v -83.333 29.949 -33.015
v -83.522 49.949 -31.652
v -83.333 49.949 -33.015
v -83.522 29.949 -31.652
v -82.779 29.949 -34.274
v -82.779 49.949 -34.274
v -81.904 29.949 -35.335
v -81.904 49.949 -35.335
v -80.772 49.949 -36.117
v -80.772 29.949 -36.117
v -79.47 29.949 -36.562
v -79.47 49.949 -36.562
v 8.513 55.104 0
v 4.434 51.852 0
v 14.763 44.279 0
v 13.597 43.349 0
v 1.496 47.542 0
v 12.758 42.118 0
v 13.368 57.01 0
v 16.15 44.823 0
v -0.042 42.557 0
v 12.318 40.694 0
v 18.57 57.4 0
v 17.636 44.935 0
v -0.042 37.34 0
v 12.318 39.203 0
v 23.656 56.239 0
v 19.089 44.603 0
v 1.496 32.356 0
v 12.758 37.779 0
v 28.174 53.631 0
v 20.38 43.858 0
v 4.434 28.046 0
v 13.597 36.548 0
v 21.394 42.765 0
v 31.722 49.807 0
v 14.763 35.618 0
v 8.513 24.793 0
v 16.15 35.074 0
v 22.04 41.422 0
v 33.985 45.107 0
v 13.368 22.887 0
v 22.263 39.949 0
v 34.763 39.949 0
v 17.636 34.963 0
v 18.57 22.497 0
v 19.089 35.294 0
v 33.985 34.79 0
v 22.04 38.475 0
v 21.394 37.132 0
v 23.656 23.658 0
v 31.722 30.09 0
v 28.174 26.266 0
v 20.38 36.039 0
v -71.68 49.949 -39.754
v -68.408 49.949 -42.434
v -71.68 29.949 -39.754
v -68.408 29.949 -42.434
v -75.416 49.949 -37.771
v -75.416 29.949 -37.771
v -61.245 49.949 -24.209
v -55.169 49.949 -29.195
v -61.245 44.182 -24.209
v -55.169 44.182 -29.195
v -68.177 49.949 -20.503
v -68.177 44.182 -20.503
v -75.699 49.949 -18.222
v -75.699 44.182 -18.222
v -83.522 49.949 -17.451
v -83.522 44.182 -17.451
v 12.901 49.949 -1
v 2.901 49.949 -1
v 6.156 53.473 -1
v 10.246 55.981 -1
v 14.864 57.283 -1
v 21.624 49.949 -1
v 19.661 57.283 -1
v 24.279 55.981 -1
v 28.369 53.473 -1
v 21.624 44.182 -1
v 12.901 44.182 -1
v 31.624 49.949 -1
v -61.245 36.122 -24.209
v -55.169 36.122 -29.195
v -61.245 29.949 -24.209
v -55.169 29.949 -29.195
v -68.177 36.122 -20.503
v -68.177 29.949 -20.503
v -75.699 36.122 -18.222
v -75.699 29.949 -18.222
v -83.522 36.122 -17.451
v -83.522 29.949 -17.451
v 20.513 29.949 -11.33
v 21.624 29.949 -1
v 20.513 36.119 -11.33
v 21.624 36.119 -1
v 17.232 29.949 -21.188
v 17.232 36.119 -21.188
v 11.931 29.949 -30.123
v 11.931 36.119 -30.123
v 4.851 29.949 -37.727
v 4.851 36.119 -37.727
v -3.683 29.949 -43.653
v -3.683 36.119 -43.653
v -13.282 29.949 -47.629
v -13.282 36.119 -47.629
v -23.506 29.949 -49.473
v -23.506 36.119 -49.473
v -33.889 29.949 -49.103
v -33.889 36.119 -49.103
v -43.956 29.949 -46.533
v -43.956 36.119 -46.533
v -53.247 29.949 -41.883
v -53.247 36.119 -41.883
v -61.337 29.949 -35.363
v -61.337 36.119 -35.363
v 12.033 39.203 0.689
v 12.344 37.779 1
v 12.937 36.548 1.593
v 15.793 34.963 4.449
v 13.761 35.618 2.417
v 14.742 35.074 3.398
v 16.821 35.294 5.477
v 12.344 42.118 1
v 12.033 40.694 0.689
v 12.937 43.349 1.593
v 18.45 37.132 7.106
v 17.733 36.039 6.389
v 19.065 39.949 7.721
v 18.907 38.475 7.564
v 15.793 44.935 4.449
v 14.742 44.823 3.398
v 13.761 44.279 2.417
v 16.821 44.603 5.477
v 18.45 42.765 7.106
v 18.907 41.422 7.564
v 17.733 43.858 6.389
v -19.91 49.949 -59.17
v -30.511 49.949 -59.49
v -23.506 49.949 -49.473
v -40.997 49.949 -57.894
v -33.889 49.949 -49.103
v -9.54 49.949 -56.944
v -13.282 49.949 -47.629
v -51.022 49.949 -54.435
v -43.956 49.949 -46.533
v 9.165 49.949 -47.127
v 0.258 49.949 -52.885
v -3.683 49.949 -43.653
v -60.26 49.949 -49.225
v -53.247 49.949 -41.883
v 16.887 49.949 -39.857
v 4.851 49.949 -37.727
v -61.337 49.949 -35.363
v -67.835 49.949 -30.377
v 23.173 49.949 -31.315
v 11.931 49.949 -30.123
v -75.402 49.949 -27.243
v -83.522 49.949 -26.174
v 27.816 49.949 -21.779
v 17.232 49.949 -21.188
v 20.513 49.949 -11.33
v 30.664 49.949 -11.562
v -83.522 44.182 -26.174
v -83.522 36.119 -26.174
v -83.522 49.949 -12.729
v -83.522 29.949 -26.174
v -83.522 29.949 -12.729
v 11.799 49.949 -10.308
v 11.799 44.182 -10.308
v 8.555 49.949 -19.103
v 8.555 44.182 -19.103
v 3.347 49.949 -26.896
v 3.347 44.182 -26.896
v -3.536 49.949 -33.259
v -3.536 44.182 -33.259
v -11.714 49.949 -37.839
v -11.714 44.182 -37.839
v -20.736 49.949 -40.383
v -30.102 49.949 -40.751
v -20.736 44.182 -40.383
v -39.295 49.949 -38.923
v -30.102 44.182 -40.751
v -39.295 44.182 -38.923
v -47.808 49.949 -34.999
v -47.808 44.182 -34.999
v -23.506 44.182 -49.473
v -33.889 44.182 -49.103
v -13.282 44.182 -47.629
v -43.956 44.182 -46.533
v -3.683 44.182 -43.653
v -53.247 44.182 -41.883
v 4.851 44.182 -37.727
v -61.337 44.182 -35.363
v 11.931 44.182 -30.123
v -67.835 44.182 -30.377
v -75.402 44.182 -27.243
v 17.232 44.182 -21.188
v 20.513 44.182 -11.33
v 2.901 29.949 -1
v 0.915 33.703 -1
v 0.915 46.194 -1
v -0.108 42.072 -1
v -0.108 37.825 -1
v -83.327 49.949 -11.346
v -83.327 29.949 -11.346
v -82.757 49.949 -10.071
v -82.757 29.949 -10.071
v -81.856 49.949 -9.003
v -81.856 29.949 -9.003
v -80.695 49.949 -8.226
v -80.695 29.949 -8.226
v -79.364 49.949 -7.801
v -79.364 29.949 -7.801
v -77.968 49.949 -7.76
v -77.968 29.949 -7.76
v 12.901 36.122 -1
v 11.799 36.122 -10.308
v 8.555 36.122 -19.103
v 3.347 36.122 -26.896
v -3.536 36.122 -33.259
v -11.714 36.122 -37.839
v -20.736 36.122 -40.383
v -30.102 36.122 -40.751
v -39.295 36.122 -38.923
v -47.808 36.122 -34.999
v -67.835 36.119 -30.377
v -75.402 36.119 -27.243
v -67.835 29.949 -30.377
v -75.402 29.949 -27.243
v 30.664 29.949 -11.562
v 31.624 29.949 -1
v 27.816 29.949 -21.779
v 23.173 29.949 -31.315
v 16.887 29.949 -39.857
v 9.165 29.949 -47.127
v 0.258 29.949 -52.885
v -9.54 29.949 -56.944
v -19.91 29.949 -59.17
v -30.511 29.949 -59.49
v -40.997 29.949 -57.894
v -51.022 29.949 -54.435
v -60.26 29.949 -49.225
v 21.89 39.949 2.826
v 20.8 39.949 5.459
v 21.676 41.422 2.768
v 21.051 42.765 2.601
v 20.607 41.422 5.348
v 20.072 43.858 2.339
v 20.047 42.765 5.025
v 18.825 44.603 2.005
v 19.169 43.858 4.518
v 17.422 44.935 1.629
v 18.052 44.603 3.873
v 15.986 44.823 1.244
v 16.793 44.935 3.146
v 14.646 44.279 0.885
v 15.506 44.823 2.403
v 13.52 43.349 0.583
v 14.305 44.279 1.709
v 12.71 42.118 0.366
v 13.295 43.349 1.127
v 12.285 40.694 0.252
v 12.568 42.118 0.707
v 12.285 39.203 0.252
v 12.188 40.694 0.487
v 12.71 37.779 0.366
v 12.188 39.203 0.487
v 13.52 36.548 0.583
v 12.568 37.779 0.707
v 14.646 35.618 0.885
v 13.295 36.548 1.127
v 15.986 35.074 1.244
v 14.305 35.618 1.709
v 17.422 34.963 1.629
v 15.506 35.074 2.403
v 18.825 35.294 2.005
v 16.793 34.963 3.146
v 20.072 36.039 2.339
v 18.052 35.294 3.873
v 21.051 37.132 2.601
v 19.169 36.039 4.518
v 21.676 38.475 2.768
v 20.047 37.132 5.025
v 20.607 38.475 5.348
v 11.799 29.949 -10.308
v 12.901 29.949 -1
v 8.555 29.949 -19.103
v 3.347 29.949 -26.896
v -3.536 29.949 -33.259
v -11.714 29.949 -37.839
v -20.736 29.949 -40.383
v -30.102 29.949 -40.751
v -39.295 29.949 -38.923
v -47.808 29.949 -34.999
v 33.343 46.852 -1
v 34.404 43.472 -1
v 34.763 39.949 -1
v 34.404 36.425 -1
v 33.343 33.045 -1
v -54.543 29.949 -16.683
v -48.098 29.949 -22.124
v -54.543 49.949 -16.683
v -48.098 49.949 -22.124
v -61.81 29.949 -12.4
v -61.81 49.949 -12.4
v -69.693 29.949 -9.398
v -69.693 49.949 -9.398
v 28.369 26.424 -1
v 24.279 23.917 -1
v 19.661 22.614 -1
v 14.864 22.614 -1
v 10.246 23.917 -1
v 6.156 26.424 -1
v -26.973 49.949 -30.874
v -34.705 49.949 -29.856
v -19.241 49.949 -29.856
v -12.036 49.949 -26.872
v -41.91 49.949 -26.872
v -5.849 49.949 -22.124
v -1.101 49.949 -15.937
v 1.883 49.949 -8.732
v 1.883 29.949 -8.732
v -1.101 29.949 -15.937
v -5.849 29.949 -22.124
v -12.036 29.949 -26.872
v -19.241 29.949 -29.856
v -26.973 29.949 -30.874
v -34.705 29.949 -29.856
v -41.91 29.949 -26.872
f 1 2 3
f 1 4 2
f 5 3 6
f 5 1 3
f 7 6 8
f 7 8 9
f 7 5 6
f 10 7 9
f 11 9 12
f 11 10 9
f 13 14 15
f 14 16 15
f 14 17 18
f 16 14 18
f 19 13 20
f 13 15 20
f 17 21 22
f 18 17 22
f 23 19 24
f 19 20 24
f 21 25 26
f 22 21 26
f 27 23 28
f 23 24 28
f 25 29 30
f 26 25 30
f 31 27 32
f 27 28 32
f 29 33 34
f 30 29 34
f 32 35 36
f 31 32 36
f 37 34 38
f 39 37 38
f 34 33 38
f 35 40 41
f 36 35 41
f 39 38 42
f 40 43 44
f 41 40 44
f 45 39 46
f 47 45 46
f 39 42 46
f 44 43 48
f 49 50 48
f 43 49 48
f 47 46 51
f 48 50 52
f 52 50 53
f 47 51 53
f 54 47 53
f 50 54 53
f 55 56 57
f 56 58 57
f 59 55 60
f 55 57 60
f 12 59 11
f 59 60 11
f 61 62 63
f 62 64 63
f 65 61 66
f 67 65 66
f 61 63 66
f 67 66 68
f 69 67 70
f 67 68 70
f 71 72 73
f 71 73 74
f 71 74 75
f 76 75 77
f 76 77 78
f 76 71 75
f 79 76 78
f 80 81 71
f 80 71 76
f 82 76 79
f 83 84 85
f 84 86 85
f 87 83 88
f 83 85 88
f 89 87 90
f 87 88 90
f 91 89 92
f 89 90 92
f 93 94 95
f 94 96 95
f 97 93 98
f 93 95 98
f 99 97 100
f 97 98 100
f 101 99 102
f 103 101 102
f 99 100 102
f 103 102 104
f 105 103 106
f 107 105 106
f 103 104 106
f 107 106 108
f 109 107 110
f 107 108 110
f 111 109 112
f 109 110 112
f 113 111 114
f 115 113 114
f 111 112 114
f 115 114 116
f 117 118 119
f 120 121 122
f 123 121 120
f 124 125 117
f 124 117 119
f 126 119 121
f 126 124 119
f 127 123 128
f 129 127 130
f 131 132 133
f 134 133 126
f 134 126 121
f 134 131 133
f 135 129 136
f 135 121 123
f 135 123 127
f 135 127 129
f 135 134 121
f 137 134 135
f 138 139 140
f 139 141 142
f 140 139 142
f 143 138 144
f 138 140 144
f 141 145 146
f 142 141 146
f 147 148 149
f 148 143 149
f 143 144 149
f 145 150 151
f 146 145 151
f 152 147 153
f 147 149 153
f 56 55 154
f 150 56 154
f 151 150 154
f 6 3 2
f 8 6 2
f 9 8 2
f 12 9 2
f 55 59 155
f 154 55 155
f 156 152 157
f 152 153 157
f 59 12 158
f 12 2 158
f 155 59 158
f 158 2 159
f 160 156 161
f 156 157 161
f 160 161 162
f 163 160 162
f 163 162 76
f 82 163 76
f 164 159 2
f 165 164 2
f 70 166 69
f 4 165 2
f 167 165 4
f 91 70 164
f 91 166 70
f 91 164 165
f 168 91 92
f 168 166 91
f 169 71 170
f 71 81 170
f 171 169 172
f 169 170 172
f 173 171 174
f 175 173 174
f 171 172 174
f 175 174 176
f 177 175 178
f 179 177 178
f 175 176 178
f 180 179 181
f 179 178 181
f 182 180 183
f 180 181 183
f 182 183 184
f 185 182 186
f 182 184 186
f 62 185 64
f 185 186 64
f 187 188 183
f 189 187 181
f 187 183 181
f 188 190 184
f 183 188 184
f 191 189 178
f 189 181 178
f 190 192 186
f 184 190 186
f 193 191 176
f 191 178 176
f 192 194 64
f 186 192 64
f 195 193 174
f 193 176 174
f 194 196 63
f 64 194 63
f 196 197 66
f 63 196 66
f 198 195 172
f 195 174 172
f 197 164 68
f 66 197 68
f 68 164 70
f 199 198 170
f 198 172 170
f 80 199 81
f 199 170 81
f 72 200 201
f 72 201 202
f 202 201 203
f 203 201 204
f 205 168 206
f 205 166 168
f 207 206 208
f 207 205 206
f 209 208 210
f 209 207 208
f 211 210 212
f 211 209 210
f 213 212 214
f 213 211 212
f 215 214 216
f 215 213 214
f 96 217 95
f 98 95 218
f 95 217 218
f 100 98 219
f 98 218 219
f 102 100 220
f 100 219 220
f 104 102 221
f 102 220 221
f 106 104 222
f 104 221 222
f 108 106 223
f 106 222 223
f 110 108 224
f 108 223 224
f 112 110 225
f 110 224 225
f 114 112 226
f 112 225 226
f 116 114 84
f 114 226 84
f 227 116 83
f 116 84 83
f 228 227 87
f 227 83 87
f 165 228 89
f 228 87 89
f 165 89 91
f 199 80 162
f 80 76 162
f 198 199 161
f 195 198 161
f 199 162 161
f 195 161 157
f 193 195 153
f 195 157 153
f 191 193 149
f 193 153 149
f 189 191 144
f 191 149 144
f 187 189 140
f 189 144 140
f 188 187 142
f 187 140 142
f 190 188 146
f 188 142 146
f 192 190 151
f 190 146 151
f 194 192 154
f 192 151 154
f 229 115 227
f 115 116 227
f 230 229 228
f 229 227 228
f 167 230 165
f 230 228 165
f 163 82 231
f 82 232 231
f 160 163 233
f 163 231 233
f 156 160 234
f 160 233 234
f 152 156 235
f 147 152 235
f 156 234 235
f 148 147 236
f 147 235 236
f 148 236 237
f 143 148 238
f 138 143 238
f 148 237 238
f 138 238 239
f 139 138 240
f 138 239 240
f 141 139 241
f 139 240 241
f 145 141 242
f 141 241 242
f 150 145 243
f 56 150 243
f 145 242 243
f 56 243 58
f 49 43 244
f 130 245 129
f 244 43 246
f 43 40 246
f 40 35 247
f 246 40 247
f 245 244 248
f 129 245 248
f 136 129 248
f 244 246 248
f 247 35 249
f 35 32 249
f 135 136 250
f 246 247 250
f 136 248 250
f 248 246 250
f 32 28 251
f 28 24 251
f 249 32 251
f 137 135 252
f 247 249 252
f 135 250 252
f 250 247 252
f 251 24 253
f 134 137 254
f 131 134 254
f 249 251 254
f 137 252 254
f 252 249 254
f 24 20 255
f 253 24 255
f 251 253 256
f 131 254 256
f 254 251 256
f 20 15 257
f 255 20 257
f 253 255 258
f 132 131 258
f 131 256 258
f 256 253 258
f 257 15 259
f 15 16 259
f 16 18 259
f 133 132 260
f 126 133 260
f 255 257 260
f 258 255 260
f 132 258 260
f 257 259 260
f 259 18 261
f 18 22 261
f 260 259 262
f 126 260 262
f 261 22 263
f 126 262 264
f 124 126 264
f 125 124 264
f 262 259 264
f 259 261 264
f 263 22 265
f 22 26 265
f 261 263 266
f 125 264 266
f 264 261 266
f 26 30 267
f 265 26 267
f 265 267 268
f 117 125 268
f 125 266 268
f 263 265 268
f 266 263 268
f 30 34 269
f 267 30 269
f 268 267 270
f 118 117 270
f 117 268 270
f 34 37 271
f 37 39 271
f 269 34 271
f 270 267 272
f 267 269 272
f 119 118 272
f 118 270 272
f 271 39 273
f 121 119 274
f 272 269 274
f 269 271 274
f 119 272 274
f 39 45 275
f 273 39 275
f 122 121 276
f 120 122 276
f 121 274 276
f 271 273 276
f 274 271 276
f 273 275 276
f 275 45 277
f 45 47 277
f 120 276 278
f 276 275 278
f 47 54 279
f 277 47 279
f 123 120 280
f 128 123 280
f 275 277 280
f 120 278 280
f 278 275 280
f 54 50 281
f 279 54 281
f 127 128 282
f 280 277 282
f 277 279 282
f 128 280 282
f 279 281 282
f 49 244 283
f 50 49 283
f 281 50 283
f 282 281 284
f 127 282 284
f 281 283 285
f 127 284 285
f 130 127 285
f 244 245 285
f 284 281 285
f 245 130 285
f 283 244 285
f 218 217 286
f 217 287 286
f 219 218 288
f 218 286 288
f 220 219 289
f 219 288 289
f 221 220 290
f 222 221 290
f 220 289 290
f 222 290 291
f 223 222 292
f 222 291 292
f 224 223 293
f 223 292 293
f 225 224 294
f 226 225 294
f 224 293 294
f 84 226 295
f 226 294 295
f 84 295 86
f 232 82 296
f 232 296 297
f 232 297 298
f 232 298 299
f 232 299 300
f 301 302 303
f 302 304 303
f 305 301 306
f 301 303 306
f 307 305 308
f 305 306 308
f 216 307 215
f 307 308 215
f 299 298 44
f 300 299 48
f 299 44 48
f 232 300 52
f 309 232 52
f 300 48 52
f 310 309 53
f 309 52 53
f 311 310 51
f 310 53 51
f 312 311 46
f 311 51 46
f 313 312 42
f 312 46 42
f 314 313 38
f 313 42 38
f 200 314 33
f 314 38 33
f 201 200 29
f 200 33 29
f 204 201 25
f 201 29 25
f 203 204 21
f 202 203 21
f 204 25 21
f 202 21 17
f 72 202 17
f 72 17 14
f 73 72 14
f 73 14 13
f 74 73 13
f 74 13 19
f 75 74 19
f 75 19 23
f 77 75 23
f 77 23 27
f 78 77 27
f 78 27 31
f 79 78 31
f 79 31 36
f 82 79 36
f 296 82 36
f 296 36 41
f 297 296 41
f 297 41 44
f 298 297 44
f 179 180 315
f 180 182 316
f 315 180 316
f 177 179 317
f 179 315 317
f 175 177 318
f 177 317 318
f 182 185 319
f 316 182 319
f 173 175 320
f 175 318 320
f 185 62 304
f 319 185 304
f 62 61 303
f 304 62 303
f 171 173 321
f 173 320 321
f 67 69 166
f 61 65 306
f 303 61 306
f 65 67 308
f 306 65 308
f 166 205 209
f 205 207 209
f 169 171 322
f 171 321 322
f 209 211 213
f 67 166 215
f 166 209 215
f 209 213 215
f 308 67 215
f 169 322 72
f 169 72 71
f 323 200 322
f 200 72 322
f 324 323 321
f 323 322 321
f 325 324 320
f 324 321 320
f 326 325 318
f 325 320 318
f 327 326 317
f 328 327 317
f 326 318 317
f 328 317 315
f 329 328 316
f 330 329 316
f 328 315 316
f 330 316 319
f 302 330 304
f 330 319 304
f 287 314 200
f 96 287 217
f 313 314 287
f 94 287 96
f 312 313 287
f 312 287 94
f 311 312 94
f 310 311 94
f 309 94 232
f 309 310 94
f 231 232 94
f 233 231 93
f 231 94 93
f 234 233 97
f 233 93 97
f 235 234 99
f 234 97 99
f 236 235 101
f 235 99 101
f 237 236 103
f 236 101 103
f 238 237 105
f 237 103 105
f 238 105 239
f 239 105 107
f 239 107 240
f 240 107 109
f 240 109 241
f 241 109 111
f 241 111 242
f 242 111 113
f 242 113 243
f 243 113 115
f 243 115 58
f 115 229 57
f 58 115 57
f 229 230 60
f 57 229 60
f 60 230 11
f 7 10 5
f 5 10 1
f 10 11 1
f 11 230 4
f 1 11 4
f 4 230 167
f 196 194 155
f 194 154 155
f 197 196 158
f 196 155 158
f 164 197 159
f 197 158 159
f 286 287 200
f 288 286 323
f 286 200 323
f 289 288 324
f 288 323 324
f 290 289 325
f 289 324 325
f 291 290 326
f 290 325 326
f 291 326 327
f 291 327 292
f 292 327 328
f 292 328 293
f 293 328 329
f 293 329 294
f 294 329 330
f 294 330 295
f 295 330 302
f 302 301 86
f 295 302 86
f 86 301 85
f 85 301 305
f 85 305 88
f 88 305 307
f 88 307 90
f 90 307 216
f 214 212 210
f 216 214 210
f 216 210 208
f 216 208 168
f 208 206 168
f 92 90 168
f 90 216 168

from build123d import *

# Parameters (mm, degrees)
F0_R     = 5
F1_ANGLE = 45
F2_R     = 17.5
F2_R_2   = 5
F3_DEPTH = 1
F5_ANGLE = 135
F7_ANGLE = 45
F8_R     = 5
F9_R     = 5


with BuildPart() as f1:
    # F0 (on Top) → F1 (revolve)
    with BuildSketch(Plane.XY):
        with Locations((17.2625295818, 39.9485491216)):
            Circle(F0_R)
    revolve(axis=Axis((11.3439466804, 38.7977138162, 0), (0, -1, 0)), revolution_arc=F1_ANGLE)

    # F2 (on face) → F3 (join)
    with BuildSketch(Plane(origin=(0, 0, 0), x_dir=(1, 0, 0), z_dir=(0, 0, -1))):
        with Locations((17.2625295818, -39.9485491216)):
            Circle(F2_R)
        with Locations((17.2625295818, -39.9485491216)):
            Circle(F2_R_2, mode=Mode.SUBTRACT)
        with Locations((17.2625295818, -39.9485491216)):
            Circle(F2_R_2)
    extrude(amount=F3_DEPTH)

    # F4 (on face) → F5 (revolve)
    with BuildSketch(Plane(origin=(0, 0, -1), x_dir=(1, 0, 0), z_dir=(0, 0, -1))):
        Polygon((12.9011229654, -29.9485491216), (2.9011229654, -29.9485491216), (2.9011229654, -49.9485491216), (12.9011229654, -49.9485491216), (12.9011229654, -44.1824280606), (21.6239361981, -44.1824280606), (21.6239361981, -49.9485491216), (31.6239361981, -49.9485491216), (31.6239361981, -29.9485491216), (21.6239361981, -29.9485491216), (21.6239361981, -36.1191299331), (12.9011229654, -36.1218505295), align=None)
    revolve(axis=Axis((-26.9732894376, 40.484293364, -1), (0, 1, 0)), revolution_arc=F5_ANGLE)

    # F6 (on face) → F7 (revolve)
    with BuildSketch(Plane(origin=(-12.9866447188, 0, 12.9866447188), x_dir=(0, -1, 0), z_dir=(-0.7071067812, 0, 0.7071067812))):
        Polygon((-36.1218505295, -59.6545150564), (-29.9485491216, -59.6545150564), (-29.9485491216, -49.6545150564), (-49.9485491216, -49.6545150564), (-49.9485491216, -59.6545150564), (-44.1824280606, -59.6545150564), (-44.1824280606, -68.3773282891), (-49.9485491216, -68.3773282891), (-49.9485491216, -78.3773282891), (-29.9485491216, -78.3773282891), (-29.9485491216, -68.3773282891), (-36.1191299331, -68.3773282891), align=None)
    revolve(axis=Axis((-83.5220088064, 42.3686988652, -57.5487193688), (0, -1, 0)), revolution_arc=F7_ANGLE)

    # F8
    f8_edges = [f1.edges().sort_by_distance(p)[0] for p in [
        (-83.522009, 39.948549, -36.173979),
    ]]
    fillet(f8_edges, radius=F8_R)

    # F9
    f9_edges = [f1.edges().sort_by_distance(p)[0] for p in [
        (-83.522009, 39.948549, -7.451166),
    ]]
    fillet(f9_edges, radius=F9_R)


solid = f1.part
